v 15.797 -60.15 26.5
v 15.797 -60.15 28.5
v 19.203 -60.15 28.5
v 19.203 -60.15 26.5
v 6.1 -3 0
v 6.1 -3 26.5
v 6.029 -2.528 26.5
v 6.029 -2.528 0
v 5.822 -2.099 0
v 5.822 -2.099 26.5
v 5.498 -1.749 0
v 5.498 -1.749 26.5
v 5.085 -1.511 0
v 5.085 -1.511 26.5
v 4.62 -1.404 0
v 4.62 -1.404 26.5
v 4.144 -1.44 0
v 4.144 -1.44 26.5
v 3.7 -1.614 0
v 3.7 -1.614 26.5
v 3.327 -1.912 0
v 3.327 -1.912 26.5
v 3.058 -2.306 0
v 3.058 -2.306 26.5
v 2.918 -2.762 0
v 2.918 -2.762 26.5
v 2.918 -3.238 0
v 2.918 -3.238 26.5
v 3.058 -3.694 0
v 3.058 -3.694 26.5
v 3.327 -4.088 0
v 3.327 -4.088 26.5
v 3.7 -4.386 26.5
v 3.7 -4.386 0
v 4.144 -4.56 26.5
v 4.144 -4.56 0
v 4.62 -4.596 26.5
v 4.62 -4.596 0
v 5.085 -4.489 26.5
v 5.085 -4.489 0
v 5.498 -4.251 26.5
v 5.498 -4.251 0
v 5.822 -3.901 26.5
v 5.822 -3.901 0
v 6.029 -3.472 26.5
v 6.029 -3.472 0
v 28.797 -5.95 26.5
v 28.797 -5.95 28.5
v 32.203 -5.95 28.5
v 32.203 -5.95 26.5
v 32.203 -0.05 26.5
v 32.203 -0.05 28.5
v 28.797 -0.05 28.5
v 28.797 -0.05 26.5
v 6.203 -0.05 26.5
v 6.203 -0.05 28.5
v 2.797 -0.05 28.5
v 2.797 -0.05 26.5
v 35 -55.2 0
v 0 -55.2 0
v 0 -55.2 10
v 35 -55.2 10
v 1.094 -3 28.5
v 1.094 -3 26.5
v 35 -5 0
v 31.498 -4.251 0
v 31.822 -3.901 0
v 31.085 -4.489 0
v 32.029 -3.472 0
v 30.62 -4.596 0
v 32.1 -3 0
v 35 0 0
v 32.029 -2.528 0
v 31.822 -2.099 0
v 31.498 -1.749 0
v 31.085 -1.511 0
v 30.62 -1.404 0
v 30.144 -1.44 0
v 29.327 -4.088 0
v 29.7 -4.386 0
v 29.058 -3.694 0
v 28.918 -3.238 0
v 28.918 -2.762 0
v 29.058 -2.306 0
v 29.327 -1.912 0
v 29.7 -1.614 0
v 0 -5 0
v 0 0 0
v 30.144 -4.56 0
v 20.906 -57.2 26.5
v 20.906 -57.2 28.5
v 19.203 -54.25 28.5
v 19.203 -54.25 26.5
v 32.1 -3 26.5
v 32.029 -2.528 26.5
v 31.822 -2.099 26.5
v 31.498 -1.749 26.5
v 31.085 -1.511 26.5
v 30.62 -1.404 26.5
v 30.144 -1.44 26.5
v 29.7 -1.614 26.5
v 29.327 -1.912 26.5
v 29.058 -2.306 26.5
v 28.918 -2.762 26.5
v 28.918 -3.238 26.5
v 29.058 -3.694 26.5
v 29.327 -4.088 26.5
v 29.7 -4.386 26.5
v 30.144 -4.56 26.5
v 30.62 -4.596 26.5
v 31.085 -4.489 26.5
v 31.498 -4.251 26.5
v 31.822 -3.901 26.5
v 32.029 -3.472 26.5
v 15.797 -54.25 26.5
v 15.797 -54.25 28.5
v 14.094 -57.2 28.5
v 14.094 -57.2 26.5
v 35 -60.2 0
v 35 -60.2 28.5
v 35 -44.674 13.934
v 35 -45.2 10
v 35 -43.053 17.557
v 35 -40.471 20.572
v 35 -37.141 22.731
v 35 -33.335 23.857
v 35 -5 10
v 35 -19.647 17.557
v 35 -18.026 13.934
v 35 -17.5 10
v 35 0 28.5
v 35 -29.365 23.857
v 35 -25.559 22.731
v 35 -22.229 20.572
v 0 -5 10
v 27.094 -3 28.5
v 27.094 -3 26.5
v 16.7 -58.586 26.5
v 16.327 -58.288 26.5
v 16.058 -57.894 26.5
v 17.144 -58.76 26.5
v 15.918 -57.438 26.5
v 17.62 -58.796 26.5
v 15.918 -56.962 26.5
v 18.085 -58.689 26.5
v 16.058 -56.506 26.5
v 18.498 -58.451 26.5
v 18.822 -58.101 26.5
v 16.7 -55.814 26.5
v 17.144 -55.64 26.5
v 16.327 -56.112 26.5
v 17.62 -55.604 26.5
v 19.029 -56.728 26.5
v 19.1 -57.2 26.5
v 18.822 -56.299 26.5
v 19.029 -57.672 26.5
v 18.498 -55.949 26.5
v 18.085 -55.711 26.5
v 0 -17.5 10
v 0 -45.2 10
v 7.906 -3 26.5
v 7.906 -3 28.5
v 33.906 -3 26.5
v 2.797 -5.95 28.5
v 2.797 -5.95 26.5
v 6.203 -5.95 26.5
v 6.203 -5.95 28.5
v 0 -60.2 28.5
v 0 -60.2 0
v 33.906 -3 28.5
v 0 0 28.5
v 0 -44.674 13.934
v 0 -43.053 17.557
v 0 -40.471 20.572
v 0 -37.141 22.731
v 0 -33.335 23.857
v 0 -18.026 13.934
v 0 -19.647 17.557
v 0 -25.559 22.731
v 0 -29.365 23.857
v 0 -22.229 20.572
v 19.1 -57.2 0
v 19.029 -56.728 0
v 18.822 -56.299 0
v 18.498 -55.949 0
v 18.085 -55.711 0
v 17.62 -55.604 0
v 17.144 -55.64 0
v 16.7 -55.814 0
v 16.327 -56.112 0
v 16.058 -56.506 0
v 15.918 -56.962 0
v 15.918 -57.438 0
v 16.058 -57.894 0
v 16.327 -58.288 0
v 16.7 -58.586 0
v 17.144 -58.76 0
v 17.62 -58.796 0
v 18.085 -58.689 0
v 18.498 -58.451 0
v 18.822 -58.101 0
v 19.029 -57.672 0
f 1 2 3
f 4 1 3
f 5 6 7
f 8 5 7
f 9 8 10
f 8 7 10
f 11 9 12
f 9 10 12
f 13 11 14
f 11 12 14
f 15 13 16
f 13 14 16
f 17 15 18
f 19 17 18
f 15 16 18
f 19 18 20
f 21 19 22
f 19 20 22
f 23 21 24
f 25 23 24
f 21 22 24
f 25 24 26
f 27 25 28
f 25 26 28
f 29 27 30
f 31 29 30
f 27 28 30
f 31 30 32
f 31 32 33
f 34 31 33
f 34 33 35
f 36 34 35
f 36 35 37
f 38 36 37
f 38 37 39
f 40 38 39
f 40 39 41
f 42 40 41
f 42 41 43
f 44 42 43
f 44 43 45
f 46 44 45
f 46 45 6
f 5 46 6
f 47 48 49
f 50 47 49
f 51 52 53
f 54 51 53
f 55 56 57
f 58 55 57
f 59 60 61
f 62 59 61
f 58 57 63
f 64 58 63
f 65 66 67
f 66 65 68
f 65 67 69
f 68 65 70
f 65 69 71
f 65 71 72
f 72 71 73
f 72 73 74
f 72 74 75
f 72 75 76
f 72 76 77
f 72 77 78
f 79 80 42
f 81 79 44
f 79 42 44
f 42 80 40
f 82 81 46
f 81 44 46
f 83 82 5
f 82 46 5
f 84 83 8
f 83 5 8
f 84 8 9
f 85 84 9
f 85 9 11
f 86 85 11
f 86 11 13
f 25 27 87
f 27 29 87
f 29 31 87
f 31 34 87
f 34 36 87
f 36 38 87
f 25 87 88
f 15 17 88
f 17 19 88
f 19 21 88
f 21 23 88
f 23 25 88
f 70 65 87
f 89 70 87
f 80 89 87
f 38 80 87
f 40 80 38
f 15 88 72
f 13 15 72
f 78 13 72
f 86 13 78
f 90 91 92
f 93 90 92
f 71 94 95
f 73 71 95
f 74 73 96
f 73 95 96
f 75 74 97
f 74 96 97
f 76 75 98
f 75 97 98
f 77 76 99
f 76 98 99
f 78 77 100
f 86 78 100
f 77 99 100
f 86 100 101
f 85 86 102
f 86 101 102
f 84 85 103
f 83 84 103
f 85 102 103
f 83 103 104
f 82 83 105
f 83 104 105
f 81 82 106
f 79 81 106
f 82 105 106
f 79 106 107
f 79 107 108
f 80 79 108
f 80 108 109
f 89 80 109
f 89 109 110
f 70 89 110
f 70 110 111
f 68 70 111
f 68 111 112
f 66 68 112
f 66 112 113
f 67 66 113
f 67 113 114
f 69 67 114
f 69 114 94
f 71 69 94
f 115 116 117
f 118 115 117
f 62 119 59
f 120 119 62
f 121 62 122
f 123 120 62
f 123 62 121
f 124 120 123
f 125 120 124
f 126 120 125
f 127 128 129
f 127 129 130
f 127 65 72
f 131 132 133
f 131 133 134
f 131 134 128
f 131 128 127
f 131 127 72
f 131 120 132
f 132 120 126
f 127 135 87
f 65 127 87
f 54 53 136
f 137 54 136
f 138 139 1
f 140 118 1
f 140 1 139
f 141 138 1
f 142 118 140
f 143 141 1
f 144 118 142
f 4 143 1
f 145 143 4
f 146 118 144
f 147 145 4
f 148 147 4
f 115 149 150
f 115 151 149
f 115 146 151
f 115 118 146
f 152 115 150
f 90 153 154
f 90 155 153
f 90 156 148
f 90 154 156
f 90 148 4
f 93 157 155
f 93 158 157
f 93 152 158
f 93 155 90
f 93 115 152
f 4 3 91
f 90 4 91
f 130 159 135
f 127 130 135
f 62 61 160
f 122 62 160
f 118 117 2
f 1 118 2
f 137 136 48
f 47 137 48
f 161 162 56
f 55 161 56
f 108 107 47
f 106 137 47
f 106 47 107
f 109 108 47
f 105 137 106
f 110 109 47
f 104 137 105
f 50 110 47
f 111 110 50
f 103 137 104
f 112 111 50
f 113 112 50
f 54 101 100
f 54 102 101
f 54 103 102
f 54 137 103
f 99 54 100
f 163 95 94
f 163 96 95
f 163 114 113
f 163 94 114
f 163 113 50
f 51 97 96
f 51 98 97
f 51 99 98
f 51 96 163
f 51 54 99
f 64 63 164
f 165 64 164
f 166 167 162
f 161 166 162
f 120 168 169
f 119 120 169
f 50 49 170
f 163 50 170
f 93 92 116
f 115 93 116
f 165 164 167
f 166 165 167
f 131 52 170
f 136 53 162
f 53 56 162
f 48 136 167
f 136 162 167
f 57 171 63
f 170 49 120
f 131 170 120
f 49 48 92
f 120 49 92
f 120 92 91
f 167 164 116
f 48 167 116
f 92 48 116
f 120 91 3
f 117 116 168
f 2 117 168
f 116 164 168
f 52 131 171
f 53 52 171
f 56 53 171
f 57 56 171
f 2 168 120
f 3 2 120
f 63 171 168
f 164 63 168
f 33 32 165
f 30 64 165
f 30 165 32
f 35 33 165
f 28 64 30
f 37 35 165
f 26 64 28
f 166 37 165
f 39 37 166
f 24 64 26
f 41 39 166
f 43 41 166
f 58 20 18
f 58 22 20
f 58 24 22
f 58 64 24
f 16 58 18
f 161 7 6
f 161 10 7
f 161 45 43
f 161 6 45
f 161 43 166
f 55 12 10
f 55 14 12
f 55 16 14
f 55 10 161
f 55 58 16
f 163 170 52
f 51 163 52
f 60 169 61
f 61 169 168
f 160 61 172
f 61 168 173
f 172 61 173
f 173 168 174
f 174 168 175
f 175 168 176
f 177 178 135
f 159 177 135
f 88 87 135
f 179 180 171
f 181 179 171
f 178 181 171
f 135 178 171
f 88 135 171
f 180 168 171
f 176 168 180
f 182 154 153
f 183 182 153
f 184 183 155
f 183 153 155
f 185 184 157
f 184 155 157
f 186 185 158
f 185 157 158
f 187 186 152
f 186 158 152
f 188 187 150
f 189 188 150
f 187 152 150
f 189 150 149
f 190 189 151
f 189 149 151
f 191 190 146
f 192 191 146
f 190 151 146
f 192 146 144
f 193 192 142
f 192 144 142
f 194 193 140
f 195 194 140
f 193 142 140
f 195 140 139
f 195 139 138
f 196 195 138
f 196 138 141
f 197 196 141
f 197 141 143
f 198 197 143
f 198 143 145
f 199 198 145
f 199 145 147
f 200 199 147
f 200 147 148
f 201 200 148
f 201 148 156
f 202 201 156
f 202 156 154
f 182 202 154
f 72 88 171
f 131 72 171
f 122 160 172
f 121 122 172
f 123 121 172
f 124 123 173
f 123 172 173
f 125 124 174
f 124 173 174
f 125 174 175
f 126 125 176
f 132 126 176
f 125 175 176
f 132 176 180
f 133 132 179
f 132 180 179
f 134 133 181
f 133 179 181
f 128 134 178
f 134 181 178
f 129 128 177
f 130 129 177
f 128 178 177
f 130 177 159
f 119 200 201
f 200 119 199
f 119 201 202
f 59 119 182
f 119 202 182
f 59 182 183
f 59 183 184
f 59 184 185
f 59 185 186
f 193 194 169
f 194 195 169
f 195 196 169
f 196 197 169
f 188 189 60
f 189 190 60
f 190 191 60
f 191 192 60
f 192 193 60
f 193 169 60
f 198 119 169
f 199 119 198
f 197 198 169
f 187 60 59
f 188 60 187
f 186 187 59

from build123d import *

# Parameters (mm, degrees)
F1_DEPTH = 35
F2_R     = 1.6
F3_DEPTH = 28.5
F5_DEPTH = 2


with BuildPart() as f1:
    # F0 (on Right) → F1 (new body)
    with BuildSketch(Plane.YZ):
        with BuildLine():
            Line((0, 0), (0, 28.5))
            Line((0, 28.5), (-60.2, 28.5))
            Line((-60.2, 28.5), (-60.2, 0))
            Line((-60.2, 0), (-55.2, 0))
            Line((-55.2, 0), (-55.2, 10))
            Line((-55.2, 10), (-45.2, 10))
            ThreePointArc((-45.2, 10), (-31.35, 24), (-17.5, 10))
            Line((-17.5, 10), (-5, 10))
            Line((-5, 10), (-5, 0))
            Line((-5, 0), (0, 0))
        make_face()
    extrude(amount=F1_DEPTH)

    # F2 (on face) → F3 (cut, through all)
    with BuildSketch(Plane.XY.offset(28.5)):
        with Locations((4.5, -3)):
            Circle(F2_R)
        with Locations((30.5, -3)):
            Circle(F2_R)
        with Locations((17.5, -57.2)):
            Circle(F2_R)
    extrude(amount=-F3_DEPTH, mode=Mode.SUBTRACT)

    # F4 (on face) → F5 (cut)
    with BuildSketch(Plane.XY.offset(28.5)):
        Polygon((2.796817, -5.95), (6.203183, -5.95), (7.906367, -3), (6.203183, -0.05), (2.796817, -0.05), (1.093633, -3), align=None)
        Polygon((28.796817, -5.95), (32.203183, -5.95), (33.906367, -3), (32.203183, -0.05), (28.796817, -0.05), (27.093633, -3), align=None)
        Polygon((19.203183, -54.25), (15.796817, -54.25), (14.093633, -57.2), (15.796817, -60.15), (19.203183, -60.15), (20.906367, -57.2), align=None)
    extrude(amount=-F5_DEPTH, mode=Mode.SUBTRACT)


solid = f1.part
